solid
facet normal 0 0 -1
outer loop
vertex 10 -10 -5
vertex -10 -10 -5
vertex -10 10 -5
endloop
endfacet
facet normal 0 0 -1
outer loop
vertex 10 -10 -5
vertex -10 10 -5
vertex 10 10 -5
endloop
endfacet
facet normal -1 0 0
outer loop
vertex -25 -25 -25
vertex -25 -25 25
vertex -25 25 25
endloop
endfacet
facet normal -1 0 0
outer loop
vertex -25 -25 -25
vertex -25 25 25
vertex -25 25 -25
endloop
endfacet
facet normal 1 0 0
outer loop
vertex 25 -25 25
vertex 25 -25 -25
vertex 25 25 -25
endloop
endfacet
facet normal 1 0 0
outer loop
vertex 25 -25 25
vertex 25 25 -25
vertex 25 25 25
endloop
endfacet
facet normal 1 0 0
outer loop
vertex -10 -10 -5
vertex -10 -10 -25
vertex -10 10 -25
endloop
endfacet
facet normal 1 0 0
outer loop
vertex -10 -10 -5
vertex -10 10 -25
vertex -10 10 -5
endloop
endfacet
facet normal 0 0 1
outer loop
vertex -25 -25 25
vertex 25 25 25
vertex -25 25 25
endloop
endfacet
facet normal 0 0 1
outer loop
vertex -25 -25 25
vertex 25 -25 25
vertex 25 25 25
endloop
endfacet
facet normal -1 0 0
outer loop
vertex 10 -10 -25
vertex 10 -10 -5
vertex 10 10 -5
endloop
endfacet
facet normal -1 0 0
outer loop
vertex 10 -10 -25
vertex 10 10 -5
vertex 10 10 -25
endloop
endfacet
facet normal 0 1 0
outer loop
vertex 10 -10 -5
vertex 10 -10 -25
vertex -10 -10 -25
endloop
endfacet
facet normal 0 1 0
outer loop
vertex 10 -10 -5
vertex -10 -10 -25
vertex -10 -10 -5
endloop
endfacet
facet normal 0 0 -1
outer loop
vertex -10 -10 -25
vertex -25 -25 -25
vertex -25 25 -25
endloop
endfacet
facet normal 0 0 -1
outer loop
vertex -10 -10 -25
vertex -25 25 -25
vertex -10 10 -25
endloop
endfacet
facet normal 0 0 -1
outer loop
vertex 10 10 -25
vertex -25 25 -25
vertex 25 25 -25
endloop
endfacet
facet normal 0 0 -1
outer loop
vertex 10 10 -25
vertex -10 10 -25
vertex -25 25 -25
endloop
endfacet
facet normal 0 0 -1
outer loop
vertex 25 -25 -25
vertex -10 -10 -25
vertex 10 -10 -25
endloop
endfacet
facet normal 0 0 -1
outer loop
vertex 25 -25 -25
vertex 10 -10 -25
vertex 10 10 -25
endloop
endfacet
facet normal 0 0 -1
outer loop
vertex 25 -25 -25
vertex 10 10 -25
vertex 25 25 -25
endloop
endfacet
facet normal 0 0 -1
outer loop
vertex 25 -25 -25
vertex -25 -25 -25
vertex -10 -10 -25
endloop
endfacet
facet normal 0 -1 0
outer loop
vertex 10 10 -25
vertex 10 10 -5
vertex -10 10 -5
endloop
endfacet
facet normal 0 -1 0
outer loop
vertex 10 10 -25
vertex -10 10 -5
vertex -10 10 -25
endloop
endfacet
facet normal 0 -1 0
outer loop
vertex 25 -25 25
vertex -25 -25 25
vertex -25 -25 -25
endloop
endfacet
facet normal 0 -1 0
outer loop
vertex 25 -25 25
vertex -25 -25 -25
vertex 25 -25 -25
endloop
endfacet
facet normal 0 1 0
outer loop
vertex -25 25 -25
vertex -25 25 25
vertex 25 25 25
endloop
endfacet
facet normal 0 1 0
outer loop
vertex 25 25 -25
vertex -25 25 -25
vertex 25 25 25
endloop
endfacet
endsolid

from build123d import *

# Parameters (mm, degrees)
F1_DEPTH = 25
F3_DEPTH = 25


with BuildPart() as f1:
    # F0 (on Front) → F1 (new body, symmetric)
    with BuildSketch(Plane.XZ):
        Polygon((-25, 25), (-25, -25), (-10, -25), (-10, -5), (10, -5), (10, -25), (25, -25), (25, 25), align=None)
    extrude(amount=F1_DEPTH, both=True)

    # F2 (on Right) → F3 (join, symmetric)
    with BuildSketch(Plane.YZ):
        Polygon((25, -25), (25, 25), (-25, 25), (-25, -25), (-10, -25), (-10, -5), (10, -5), (10, -25), align=None)
    extrude(amount=F3_DEPTH, both=True)


solid = f1.part
